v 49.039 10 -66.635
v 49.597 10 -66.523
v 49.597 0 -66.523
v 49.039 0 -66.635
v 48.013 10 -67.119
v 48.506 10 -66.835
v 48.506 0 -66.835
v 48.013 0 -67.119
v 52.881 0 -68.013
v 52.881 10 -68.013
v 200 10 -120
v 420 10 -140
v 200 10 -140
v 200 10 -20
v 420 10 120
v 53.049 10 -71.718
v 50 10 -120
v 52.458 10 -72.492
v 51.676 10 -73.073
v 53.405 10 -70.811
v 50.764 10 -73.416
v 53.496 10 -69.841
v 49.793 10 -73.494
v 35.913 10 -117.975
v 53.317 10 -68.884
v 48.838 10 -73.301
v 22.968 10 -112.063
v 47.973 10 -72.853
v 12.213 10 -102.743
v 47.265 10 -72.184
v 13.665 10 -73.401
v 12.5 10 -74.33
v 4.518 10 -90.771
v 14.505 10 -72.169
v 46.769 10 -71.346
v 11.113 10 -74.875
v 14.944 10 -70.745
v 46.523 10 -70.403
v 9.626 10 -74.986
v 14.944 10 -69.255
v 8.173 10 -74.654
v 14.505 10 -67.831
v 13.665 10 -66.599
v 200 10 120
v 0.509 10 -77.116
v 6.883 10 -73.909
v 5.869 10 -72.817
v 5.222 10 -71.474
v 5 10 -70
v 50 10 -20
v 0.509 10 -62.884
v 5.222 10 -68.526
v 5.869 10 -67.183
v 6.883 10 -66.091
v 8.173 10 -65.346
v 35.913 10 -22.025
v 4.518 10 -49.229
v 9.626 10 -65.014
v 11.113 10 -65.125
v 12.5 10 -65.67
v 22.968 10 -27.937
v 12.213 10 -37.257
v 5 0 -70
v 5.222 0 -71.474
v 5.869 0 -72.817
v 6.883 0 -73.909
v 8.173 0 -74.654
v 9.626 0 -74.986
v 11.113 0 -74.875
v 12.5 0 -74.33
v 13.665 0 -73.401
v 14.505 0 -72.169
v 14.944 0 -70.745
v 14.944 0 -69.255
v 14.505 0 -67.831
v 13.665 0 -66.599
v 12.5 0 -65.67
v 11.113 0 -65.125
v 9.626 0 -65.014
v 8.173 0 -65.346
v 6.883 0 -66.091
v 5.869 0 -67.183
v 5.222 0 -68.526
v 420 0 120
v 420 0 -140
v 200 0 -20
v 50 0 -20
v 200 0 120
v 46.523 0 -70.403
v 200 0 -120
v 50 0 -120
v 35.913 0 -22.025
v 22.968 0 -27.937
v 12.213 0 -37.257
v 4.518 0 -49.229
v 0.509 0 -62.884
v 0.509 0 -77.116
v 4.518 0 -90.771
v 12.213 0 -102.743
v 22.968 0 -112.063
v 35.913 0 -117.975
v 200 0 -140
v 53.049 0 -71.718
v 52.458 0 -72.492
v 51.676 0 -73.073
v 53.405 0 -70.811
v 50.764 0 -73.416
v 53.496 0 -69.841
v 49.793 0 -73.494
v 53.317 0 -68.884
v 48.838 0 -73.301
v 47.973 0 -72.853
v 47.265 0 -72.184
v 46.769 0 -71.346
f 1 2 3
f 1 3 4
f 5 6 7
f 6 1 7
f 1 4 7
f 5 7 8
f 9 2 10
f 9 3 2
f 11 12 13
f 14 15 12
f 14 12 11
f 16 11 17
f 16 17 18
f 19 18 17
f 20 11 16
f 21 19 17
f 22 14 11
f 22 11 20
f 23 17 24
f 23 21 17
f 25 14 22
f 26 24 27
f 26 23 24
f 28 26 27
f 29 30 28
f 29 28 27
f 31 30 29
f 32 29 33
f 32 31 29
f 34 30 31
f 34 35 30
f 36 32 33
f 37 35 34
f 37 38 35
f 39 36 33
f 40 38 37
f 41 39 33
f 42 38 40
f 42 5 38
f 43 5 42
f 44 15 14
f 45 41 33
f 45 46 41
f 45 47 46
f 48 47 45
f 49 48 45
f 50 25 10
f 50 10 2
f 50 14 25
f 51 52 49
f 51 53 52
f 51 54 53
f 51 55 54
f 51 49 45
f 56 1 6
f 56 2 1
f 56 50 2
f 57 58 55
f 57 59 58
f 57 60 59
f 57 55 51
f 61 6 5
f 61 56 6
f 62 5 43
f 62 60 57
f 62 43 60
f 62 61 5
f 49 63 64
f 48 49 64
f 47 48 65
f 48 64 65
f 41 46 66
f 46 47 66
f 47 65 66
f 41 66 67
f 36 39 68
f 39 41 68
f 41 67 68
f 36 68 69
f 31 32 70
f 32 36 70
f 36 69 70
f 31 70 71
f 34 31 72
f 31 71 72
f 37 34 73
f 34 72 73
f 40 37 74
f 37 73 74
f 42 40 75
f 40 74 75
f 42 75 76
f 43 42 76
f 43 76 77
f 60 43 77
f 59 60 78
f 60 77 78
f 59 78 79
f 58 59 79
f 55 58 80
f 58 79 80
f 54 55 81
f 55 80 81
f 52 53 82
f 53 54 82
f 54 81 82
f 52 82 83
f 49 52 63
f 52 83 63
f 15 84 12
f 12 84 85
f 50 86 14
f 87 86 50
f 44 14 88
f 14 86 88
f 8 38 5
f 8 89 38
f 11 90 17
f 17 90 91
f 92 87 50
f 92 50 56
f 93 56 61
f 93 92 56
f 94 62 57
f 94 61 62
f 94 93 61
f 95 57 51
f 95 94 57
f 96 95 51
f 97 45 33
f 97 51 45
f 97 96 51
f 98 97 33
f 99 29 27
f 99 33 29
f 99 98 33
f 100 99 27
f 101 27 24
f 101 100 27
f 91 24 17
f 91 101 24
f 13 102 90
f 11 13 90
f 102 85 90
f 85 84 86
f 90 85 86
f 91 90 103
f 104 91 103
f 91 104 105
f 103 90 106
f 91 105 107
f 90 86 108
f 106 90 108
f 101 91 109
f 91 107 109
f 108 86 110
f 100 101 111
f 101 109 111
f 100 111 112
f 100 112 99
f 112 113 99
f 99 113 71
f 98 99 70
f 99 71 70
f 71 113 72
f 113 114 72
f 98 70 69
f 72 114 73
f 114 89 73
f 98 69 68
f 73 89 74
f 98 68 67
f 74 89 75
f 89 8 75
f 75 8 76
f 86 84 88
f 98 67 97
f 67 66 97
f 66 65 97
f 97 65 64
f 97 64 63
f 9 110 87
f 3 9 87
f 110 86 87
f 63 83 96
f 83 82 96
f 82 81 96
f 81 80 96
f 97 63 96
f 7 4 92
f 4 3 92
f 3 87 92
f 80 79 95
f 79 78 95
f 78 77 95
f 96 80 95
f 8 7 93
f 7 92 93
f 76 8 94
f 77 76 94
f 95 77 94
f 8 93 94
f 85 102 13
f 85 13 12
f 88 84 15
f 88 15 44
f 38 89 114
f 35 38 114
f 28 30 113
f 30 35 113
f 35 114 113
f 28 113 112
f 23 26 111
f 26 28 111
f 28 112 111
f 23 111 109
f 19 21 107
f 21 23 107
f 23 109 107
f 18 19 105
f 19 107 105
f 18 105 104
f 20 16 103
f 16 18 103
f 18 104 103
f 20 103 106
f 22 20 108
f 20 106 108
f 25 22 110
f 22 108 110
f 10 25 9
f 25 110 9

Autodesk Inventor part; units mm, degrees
ref_plane "YZ Plane" through (0, 0, 0) normal (1, 0, 0) x (0, 1, 0)
ref_plane "XZ Plane" through (0, 0, 0) normal (0, 1, 0) x (-1, 0, 0)
ref_plane "XY Plane" through (0, 0, 0) normal (0, 0, 1) x (1, 0, 0)
sketch "Boceto1" plane through (0, 0, 0) normal (0, 1, 0) x (-1, 0, 0)
  line L0 (-420, 120) -> (-420, -140)
  circle A0 centre (-50, -70) radius 3
  circle A1 centre (-10, -70) radius 5
  line L1 (-200, -140) -> (-200, 120)
  circle A2 centre (-50, -70) radius 50
  line L2 (-200, -20) -> (-50, -20)
  line L3 (-200, -120) -> (-50, -120)
  line L4 (-200, -140) -> (-420, -140)
  line L5 (-420, 120) -> (-200, 120)
  circle A3 centre (-50, -70) radius 3.5
  arc A4 (-52.881, -68.0126) -> (-46.5233, -70.4029) centre (-50, -70) ccw
  line L6 (-50, -70) -> (-52.881, -68.0126) construction
  line L7 (-50, -70) -> (-46.5233, -70.4029) construction
  arc A5 (-48.0126, -67.119) -> (-49.5971, -66.5233) centre (-50, -70) ccw
  line L8 (-50, -70) -> (-49.5971, -66.5233) construction
  line L9 (-50, -70) -> (-48.0126, -67.119) construction
  line L10 (-46.5233, -70.4029) -> (-48.0126, -67.119)
  line L11 (-49.5971, -66.5233) -> (-52.881, -68.0126)
  point P0 (0, 0)
  dimension "d1" = 260
  dimension "d10" = 6
  dimension "d14" = 10
  dimension "d22" = 40
  dimension "d29" = 220
  dimension "d43" = 100
  dimension "d51" = 20
  dimension "d52" = 200
  dimension "d58" = 7
  dimension "d63" = 207.99
  dimension "d64" = 27.99
  dimension "d71" = 20
extrude "Extrusión2" add sketch "Boceto1" along normal blind 10 contours L5 L1 L4 L0 | L2 A2 L3 L1 | A2 | A0 | A0 L10 A3 L11 | L10 A3 | A0 L11 A3 L10 | L11 A3 | A1
extrude "Extrusión4" cut sketch "Boceto1" along normal blind 10 contours A1
extrude "Extrusión5" cut sketch "Boceto1" along normal blind 10 contours A0 | A0 L10 A3 L11 | A0 L11 A3 L10
properties part number "Posicionador" material "Acero, fundido"
